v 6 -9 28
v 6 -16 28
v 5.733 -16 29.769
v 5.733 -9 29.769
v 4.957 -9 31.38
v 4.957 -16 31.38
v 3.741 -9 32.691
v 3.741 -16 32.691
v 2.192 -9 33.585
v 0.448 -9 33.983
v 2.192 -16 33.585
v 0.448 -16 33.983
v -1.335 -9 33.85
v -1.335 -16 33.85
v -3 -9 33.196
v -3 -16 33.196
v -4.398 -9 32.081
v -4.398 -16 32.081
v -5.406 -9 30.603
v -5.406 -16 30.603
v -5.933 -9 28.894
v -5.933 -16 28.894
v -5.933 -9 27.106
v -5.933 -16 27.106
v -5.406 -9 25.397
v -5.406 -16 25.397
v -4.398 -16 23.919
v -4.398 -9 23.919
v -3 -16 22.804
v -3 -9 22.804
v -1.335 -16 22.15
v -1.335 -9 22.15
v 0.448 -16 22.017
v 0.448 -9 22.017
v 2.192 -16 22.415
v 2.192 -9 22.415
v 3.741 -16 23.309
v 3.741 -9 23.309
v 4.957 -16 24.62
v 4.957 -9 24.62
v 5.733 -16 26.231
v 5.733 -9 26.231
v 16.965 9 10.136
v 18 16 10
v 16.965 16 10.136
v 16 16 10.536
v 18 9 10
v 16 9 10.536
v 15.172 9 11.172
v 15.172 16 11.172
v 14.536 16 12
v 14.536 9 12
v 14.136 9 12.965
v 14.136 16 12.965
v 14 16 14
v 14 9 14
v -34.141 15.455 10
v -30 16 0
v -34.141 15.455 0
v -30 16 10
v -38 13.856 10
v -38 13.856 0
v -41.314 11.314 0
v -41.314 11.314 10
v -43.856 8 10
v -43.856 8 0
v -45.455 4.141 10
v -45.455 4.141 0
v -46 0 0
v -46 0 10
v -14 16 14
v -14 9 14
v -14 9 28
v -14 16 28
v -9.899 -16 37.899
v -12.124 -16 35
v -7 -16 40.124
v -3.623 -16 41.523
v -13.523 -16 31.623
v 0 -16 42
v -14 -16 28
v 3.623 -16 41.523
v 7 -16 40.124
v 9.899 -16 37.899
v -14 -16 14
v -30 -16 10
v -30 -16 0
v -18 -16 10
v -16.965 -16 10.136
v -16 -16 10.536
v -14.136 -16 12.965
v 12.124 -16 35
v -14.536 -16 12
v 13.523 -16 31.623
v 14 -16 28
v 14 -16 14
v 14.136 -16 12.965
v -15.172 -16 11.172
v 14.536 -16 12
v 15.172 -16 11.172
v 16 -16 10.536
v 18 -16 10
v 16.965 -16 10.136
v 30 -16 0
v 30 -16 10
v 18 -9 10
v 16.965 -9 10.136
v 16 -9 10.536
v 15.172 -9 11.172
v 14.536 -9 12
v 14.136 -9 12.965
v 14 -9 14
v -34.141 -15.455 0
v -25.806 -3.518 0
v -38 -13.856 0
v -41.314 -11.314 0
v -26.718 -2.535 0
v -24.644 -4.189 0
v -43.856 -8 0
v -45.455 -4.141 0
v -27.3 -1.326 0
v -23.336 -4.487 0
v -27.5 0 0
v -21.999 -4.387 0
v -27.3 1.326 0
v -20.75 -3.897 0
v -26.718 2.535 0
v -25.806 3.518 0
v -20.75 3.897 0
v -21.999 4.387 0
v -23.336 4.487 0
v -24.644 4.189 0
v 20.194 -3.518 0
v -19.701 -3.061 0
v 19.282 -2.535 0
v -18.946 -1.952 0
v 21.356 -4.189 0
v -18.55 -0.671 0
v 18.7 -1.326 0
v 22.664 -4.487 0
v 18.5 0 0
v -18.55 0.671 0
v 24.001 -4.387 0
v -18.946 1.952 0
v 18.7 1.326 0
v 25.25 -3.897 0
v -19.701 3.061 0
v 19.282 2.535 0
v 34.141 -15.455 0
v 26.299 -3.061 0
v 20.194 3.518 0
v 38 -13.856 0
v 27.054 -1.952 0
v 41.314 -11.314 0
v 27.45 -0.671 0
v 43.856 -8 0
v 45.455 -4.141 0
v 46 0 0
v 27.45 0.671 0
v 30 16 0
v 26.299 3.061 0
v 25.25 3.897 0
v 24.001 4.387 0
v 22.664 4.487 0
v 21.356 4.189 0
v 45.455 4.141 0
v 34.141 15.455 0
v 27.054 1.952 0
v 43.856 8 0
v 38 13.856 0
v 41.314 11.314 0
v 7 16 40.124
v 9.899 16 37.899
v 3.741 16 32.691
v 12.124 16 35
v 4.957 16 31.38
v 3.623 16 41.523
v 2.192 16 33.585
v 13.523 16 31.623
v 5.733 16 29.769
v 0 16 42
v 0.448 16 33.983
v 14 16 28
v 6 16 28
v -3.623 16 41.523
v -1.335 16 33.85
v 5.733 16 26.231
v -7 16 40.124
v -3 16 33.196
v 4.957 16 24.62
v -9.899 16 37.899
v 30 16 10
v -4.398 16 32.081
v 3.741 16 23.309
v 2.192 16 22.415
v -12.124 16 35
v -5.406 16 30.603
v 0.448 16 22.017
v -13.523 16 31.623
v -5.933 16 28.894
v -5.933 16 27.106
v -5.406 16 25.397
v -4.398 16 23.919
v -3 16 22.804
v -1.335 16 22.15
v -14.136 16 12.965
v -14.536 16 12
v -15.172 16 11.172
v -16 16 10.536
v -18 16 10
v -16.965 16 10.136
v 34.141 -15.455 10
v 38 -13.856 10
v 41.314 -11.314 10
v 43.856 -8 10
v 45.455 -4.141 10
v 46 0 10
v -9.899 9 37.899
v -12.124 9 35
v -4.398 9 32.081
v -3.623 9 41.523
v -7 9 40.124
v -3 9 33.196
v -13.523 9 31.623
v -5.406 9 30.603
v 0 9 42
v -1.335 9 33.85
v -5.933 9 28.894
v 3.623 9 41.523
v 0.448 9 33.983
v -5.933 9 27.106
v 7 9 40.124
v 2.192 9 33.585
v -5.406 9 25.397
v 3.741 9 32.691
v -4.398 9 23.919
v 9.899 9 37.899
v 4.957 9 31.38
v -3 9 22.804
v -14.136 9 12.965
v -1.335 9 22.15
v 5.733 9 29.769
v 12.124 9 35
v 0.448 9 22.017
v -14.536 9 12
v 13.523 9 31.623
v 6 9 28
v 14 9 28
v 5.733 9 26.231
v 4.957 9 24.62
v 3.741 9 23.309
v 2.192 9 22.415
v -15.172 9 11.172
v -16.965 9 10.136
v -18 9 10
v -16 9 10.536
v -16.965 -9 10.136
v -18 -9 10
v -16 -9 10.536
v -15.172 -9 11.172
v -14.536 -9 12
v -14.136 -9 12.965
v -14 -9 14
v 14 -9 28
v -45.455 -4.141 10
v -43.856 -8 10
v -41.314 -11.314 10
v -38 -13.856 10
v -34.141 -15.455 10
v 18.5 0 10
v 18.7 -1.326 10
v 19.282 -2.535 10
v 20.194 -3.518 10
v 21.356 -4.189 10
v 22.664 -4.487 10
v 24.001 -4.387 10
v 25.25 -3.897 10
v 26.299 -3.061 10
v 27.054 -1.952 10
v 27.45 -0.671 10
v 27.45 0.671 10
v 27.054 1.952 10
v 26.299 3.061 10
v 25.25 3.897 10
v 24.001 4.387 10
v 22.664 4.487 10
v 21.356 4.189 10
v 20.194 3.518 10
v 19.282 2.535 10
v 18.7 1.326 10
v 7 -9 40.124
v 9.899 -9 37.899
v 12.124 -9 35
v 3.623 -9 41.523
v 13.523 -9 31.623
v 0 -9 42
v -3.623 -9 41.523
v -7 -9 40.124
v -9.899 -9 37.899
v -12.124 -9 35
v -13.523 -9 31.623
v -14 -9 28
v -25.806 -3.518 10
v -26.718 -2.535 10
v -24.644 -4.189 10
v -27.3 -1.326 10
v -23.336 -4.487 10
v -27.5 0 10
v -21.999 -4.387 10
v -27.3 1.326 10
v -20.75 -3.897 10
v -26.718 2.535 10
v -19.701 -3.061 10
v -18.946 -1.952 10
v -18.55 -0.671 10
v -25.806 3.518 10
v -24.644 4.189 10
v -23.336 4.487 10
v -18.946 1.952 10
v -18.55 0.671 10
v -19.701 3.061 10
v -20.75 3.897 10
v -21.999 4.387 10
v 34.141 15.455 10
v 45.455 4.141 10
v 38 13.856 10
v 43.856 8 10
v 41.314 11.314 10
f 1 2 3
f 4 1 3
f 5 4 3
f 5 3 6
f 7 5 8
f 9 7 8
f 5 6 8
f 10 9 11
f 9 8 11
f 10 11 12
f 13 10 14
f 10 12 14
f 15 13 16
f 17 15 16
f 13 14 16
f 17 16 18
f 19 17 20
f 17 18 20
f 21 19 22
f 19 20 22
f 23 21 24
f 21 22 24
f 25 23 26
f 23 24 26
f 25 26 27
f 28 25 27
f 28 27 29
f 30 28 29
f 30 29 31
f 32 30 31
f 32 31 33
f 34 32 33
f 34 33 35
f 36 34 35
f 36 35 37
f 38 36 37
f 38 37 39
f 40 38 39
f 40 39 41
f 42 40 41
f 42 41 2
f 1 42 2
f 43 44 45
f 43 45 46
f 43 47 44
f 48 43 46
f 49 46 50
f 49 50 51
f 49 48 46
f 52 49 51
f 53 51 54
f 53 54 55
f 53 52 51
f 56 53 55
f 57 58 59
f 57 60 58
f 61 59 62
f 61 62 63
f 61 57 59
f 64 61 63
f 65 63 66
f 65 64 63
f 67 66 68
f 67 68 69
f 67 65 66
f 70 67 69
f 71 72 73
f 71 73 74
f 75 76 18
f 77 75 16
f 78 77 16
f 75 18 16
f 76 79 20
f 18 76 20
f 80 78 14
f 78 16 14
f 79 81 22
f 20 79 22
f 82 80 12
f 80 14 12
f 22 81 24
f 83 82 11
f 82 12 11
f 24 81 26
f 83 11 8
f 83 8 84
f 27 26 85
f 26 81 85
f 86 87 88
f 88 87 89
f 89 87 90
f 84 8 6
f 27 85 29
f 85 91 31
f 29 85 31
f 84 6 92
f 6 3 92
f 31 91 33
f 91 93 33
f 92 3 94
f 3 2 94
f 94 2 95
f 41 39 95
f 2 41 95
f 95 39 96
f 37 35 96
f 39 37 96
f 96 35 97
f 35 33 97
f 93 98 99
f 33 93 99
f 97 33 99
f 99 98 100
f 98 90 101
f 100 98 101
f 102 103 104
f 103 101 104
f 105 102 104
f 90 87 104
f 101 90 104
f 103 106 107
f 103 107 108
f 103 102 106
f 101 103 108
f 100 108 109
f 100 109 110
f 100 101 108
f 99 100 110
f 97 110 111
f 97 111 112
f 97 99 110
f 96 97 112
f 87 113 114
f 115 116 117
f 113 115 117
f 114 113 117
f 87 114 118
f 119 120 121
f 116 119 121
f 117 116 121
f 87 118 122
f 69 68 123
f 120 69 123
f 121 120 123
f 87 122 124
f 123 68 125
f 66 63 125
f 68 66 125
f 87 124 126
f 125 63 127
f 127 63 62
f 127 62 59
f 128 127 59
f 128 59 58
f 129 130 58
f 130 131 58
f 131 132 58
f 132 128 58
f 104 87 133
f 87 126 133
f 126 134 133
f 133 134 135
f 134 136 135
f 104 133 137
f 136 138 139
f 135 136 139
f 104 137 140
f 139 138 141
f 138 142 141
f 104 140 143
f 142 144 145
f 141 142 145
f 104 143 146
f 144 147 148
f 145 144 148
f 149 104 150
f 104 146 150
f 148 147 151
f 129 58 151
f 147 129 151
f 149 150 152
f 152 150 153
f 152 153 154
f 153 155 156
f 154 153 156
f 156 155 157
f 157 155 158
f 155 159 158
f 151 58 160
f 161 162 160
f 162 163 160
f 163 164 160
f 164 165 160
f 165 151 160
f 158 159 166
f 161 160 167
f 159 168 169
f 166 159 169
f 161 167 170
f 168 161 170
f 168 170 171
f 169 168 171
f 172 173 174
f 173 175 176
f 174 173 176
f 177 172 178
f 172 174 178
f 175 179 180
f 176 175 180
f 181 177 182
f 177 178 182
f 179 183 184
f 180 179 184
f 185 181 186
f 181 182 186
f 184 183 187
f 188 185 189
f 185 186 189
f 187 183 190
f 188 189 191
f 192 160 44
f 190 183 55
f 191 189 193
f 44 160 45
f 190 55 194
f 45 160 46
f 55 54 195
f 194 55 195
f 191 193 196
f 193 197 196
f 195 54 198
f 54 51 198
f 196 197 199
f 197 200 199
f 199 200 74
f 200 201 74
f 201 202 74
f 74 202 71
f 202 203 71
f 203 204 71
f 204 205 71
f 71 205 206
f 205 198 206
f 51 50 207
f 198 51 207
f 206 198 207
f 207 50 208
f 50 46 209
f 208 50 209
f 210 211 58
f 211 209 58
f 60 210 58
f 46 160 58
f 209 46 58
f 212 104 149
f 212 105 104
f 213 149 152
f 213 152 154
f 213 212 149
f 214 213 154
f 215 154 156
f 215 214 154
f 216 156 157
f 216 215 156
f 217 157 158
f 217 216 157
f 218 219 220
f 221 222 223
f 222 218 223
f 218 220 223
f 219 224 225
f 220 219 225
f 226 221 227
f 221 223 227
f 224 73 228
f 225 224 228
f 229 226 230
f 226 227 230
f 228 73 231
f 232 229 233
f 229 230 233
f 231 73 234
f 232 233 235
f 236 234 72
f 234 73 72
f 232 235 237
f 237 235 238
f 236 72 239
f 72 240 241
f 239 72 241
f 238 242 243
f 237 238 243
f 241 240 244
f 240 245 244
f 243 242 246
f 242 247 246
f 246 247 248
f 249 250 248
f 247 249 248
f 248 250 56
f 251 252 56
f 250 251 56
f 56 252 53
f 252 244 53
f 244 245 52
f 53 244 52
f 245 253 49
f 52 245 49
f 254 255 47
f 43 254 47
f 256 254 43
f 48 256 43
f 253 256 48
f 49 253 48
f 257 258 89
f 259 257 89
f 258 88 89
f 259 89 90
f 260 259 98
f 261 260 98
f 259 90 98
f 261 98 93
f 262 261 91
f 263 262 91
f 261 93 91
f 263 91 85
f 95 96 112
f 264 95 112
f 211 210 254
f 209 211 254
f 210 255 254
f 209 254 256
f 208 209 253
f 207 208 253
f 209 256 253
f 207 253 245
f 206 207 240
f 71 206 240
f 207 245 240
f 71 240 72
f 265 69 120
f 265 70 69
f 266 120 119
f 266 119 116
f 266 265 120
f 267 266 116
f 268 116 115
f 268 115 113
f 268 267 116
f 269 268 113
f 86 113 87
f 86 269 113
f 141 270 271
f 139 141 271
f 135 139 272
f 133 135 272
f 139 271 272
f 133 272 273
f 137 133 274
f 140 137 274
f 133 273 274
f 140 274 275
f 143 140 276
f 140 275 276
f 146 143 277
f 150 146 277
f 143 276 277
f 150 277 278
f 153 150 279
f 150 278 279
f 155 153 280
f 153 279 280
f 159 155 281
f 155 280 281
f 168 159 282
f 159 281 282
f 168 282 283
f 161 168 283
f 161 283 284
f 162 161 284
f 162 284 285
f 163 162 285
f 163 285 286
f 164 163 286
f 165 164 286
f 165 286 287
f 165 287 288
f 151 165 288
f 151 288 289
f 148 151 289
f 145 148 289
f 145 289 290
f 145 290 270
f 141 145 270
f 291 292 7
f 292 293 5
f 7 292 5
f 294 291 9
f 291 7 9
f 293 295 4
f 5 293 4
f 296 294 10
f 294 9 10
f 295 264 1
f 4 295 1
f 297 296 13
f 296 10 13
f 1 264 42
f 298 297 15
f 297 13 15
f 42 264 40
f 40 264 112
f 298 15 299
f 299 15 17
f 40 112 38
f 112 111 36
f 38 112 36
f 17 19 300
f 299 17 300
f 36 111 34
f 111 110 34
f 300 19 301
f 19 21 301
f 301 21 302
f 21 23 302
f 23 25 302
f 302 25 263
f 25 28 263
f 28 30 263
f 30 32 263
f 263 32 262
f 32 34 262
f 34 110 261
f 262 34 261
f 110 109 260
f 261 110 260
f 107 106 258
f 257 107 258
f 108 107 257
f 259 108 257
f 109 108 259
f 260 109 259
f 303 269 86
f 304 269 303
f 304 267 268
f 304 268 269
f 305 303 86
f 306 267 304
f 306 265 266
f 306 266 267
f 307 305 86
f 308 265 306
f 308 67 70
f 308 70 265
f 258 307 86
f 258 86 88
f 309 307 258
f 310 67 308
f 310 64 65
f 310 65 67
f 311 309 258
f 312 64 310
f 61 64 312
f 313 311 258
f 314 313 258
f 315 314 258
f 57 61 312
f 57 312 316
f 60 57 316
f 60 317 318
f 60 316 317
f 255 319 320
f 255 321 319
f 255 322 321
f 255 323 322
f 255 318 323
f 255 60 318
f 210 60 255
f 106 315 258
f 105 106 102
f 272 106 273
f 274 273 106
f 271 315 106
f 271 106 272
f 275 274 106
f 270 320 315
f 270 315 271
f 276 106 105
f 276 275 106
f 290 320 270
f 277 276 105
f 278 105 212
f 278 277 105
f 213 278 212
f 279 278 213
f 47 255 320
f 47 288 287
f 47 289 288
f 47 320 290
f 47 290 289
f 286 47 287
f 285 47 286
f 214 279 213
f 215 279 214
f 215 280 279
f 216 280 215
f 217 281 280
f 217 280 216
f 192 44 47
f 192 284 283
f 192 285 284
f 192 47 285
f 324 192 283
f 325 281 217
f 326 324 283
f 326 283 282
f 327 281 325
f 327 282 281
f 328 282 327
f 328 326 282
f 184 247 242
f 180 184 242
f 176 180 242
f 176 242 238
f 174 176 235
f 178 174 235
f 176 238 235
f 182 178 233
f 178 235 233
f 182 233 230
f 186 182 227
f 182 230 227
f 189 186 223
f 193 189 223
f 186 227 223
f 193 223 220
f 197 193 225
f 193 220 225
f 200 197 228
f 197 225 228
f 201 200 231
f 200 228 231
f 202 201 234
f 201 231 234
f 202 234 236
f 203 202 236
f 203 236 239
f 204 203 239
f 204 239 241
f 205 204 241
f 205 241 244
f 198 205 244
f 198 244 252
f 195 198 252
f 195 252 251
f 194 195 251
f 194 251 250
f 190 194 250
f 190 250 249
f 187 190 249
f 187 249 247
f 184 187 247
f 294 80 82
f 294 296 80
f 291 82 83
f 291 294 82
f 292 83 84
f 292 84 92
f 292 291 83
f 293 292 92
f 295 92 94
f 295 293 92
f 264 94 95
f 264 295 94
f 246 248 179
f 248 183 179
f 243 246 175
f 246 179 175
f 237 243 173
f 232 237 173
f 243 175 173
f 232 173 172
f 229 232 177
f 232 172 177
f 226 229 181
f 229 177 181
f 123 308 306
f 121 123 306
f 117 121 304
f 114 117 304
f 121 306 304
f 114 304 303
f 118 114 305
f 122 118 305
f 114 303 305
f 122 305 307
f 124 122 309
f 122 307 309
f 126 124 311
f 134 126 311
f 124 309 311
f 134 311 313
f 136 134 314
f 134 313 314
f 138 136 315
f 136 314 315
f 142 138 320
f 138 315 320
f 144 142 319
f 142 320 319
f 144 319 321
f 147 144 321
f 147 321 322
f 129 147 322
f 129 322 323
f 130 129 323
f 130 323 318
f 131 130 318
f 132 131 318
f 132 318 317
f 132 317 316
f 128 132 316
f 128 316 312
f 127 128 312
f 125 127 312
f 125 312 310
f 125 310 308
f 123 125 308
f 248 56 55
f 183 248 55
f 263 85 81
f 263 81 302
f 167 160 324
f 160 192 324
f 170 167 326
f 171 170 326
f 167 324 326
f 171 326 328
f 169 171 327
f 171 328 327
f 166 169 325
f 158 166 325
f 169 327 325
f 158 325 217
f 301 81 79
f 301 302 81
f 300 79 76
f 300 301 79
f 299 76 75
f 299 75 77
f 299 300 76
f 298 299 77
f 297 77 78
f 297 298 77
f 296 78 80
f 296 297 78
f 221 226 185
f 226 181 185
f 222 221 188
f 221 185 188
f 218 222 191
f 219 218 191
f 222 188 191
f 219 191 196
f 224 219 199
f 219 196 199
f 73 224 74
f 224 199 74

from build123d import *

# Parameters (mm, degrees)
F0_W     = 14
F0_H     = 7
F1_DEPTH = 10
F2_R     = 15.99999
F3_D     = 9
F4_DEPTH = 42
F5_R     = 4
F7_D     = 12
F8_R     = 13.99999


# Not quite as in the source:
# - a fillet or chamfer is up to 0.001 mm smaller than in the source, because OpenCascade refuses the exact size


with BuildPart() as f1:
    # F0 (on Top) → F1 (new body)
    with BuildSketch(Plane.XY):
        Polygon((46, 0), (46, 16), (14, 16), (14, 9), (0, 9), (0, 0), (23, 0), align=None)
        with Locations((7, 12.5)):
            Rectangle(F0_W, F0_H)
        Polygon((46, -16), (46, 0), (23, 0), (0, 0), (0, -9), (14, -9), (14, -16), align=None)
        with Locations((-7, 12.5)):
            Rectangle(F0_W, F0_H)
        Polygon((-14, 9), (-14, 16), (-46, 16), (-46, 0), (-23, 0), (0, 0), (0, 9), align=None)
        with Locations((7, -12.5)):
            Rectangle(F0_W, F0_H)
        Polygon((0, -9), (0, 0), (-23, 0), (-46, 0), (-46, -16), (-14, -16), (-14, -9), align=None)
        with Locations((-7, -12.5)):
            Rectangle(F0_W, F0_H)
    extrude(amount=F1_DEPTH)

    # F2 (radius 16 in the source; OpenCascade refuses exactly that, so slightly less here)
    f2_edges = [f1.edges().sort_by_distance(p)[0] for p in [
        (-46, -16, 5),
        (-46, 16, 5),
        (46, 16, 5),
        (46, -16, 5),
    ]]
    fillet(f2_edges, radius=F2_R)

    # F3 (through all)
    with Locations(Plane(origin=(0, 0, 0), x_dir=(1, 0, 0), z_dir=(0, 0, -1))):
        with Locations((23, 0), (-23, 0)):
            Hole(F3_D / 2)

    # F0 (on Top) → F4 (join)
    with BuildSketch(Plane.XY):
        with Locations((-7, -12.5)):
            Rectangle(F0_W, F0_H)
        with Locations((7, -12.5)):
            Rectangle(F0_W, F0_H)
        with Locations((-7, 12.5)):
            Rectangle(F0_W, F0_H)
        with Locations((7, 12.5)):
            Rectangle(F0_W, F0_H)
    extrude(amount=F4_DEPTH)

    # F5
    f5_edges = [f1.edges().sort_by_distance(p)[0] for p in [
        (14, 12.5, 10),
        (14, -12.5, 10),
        (-14, 12.5, 10),
        (-14, -12.5, 10),
    ]]
    fillet(f5_edges, radius=F5_R)

    # F7 (through all)
    with Locations(Plane(origin=(0, 16, 0), x_dir=(-1, 0, 0), z_dir=(0, 1, 0))):
        with Locations((0, 28)):
            Hole(F7_D / 2)

    # F8 (radius 14 in the source; OpenCascade refuses exactly that, so slightly less here)
    f8_edges = [f1.edges().sort_by_distance(p)[0] for p in [
        (14, 12.5, 42),
        (-14, 12.5, 42),
        (14, -12.5, 42),
        (-14, -12.5, 42),
    ]]
    fillet(f8_edges, radius=F8_R)


solid = f1.part
